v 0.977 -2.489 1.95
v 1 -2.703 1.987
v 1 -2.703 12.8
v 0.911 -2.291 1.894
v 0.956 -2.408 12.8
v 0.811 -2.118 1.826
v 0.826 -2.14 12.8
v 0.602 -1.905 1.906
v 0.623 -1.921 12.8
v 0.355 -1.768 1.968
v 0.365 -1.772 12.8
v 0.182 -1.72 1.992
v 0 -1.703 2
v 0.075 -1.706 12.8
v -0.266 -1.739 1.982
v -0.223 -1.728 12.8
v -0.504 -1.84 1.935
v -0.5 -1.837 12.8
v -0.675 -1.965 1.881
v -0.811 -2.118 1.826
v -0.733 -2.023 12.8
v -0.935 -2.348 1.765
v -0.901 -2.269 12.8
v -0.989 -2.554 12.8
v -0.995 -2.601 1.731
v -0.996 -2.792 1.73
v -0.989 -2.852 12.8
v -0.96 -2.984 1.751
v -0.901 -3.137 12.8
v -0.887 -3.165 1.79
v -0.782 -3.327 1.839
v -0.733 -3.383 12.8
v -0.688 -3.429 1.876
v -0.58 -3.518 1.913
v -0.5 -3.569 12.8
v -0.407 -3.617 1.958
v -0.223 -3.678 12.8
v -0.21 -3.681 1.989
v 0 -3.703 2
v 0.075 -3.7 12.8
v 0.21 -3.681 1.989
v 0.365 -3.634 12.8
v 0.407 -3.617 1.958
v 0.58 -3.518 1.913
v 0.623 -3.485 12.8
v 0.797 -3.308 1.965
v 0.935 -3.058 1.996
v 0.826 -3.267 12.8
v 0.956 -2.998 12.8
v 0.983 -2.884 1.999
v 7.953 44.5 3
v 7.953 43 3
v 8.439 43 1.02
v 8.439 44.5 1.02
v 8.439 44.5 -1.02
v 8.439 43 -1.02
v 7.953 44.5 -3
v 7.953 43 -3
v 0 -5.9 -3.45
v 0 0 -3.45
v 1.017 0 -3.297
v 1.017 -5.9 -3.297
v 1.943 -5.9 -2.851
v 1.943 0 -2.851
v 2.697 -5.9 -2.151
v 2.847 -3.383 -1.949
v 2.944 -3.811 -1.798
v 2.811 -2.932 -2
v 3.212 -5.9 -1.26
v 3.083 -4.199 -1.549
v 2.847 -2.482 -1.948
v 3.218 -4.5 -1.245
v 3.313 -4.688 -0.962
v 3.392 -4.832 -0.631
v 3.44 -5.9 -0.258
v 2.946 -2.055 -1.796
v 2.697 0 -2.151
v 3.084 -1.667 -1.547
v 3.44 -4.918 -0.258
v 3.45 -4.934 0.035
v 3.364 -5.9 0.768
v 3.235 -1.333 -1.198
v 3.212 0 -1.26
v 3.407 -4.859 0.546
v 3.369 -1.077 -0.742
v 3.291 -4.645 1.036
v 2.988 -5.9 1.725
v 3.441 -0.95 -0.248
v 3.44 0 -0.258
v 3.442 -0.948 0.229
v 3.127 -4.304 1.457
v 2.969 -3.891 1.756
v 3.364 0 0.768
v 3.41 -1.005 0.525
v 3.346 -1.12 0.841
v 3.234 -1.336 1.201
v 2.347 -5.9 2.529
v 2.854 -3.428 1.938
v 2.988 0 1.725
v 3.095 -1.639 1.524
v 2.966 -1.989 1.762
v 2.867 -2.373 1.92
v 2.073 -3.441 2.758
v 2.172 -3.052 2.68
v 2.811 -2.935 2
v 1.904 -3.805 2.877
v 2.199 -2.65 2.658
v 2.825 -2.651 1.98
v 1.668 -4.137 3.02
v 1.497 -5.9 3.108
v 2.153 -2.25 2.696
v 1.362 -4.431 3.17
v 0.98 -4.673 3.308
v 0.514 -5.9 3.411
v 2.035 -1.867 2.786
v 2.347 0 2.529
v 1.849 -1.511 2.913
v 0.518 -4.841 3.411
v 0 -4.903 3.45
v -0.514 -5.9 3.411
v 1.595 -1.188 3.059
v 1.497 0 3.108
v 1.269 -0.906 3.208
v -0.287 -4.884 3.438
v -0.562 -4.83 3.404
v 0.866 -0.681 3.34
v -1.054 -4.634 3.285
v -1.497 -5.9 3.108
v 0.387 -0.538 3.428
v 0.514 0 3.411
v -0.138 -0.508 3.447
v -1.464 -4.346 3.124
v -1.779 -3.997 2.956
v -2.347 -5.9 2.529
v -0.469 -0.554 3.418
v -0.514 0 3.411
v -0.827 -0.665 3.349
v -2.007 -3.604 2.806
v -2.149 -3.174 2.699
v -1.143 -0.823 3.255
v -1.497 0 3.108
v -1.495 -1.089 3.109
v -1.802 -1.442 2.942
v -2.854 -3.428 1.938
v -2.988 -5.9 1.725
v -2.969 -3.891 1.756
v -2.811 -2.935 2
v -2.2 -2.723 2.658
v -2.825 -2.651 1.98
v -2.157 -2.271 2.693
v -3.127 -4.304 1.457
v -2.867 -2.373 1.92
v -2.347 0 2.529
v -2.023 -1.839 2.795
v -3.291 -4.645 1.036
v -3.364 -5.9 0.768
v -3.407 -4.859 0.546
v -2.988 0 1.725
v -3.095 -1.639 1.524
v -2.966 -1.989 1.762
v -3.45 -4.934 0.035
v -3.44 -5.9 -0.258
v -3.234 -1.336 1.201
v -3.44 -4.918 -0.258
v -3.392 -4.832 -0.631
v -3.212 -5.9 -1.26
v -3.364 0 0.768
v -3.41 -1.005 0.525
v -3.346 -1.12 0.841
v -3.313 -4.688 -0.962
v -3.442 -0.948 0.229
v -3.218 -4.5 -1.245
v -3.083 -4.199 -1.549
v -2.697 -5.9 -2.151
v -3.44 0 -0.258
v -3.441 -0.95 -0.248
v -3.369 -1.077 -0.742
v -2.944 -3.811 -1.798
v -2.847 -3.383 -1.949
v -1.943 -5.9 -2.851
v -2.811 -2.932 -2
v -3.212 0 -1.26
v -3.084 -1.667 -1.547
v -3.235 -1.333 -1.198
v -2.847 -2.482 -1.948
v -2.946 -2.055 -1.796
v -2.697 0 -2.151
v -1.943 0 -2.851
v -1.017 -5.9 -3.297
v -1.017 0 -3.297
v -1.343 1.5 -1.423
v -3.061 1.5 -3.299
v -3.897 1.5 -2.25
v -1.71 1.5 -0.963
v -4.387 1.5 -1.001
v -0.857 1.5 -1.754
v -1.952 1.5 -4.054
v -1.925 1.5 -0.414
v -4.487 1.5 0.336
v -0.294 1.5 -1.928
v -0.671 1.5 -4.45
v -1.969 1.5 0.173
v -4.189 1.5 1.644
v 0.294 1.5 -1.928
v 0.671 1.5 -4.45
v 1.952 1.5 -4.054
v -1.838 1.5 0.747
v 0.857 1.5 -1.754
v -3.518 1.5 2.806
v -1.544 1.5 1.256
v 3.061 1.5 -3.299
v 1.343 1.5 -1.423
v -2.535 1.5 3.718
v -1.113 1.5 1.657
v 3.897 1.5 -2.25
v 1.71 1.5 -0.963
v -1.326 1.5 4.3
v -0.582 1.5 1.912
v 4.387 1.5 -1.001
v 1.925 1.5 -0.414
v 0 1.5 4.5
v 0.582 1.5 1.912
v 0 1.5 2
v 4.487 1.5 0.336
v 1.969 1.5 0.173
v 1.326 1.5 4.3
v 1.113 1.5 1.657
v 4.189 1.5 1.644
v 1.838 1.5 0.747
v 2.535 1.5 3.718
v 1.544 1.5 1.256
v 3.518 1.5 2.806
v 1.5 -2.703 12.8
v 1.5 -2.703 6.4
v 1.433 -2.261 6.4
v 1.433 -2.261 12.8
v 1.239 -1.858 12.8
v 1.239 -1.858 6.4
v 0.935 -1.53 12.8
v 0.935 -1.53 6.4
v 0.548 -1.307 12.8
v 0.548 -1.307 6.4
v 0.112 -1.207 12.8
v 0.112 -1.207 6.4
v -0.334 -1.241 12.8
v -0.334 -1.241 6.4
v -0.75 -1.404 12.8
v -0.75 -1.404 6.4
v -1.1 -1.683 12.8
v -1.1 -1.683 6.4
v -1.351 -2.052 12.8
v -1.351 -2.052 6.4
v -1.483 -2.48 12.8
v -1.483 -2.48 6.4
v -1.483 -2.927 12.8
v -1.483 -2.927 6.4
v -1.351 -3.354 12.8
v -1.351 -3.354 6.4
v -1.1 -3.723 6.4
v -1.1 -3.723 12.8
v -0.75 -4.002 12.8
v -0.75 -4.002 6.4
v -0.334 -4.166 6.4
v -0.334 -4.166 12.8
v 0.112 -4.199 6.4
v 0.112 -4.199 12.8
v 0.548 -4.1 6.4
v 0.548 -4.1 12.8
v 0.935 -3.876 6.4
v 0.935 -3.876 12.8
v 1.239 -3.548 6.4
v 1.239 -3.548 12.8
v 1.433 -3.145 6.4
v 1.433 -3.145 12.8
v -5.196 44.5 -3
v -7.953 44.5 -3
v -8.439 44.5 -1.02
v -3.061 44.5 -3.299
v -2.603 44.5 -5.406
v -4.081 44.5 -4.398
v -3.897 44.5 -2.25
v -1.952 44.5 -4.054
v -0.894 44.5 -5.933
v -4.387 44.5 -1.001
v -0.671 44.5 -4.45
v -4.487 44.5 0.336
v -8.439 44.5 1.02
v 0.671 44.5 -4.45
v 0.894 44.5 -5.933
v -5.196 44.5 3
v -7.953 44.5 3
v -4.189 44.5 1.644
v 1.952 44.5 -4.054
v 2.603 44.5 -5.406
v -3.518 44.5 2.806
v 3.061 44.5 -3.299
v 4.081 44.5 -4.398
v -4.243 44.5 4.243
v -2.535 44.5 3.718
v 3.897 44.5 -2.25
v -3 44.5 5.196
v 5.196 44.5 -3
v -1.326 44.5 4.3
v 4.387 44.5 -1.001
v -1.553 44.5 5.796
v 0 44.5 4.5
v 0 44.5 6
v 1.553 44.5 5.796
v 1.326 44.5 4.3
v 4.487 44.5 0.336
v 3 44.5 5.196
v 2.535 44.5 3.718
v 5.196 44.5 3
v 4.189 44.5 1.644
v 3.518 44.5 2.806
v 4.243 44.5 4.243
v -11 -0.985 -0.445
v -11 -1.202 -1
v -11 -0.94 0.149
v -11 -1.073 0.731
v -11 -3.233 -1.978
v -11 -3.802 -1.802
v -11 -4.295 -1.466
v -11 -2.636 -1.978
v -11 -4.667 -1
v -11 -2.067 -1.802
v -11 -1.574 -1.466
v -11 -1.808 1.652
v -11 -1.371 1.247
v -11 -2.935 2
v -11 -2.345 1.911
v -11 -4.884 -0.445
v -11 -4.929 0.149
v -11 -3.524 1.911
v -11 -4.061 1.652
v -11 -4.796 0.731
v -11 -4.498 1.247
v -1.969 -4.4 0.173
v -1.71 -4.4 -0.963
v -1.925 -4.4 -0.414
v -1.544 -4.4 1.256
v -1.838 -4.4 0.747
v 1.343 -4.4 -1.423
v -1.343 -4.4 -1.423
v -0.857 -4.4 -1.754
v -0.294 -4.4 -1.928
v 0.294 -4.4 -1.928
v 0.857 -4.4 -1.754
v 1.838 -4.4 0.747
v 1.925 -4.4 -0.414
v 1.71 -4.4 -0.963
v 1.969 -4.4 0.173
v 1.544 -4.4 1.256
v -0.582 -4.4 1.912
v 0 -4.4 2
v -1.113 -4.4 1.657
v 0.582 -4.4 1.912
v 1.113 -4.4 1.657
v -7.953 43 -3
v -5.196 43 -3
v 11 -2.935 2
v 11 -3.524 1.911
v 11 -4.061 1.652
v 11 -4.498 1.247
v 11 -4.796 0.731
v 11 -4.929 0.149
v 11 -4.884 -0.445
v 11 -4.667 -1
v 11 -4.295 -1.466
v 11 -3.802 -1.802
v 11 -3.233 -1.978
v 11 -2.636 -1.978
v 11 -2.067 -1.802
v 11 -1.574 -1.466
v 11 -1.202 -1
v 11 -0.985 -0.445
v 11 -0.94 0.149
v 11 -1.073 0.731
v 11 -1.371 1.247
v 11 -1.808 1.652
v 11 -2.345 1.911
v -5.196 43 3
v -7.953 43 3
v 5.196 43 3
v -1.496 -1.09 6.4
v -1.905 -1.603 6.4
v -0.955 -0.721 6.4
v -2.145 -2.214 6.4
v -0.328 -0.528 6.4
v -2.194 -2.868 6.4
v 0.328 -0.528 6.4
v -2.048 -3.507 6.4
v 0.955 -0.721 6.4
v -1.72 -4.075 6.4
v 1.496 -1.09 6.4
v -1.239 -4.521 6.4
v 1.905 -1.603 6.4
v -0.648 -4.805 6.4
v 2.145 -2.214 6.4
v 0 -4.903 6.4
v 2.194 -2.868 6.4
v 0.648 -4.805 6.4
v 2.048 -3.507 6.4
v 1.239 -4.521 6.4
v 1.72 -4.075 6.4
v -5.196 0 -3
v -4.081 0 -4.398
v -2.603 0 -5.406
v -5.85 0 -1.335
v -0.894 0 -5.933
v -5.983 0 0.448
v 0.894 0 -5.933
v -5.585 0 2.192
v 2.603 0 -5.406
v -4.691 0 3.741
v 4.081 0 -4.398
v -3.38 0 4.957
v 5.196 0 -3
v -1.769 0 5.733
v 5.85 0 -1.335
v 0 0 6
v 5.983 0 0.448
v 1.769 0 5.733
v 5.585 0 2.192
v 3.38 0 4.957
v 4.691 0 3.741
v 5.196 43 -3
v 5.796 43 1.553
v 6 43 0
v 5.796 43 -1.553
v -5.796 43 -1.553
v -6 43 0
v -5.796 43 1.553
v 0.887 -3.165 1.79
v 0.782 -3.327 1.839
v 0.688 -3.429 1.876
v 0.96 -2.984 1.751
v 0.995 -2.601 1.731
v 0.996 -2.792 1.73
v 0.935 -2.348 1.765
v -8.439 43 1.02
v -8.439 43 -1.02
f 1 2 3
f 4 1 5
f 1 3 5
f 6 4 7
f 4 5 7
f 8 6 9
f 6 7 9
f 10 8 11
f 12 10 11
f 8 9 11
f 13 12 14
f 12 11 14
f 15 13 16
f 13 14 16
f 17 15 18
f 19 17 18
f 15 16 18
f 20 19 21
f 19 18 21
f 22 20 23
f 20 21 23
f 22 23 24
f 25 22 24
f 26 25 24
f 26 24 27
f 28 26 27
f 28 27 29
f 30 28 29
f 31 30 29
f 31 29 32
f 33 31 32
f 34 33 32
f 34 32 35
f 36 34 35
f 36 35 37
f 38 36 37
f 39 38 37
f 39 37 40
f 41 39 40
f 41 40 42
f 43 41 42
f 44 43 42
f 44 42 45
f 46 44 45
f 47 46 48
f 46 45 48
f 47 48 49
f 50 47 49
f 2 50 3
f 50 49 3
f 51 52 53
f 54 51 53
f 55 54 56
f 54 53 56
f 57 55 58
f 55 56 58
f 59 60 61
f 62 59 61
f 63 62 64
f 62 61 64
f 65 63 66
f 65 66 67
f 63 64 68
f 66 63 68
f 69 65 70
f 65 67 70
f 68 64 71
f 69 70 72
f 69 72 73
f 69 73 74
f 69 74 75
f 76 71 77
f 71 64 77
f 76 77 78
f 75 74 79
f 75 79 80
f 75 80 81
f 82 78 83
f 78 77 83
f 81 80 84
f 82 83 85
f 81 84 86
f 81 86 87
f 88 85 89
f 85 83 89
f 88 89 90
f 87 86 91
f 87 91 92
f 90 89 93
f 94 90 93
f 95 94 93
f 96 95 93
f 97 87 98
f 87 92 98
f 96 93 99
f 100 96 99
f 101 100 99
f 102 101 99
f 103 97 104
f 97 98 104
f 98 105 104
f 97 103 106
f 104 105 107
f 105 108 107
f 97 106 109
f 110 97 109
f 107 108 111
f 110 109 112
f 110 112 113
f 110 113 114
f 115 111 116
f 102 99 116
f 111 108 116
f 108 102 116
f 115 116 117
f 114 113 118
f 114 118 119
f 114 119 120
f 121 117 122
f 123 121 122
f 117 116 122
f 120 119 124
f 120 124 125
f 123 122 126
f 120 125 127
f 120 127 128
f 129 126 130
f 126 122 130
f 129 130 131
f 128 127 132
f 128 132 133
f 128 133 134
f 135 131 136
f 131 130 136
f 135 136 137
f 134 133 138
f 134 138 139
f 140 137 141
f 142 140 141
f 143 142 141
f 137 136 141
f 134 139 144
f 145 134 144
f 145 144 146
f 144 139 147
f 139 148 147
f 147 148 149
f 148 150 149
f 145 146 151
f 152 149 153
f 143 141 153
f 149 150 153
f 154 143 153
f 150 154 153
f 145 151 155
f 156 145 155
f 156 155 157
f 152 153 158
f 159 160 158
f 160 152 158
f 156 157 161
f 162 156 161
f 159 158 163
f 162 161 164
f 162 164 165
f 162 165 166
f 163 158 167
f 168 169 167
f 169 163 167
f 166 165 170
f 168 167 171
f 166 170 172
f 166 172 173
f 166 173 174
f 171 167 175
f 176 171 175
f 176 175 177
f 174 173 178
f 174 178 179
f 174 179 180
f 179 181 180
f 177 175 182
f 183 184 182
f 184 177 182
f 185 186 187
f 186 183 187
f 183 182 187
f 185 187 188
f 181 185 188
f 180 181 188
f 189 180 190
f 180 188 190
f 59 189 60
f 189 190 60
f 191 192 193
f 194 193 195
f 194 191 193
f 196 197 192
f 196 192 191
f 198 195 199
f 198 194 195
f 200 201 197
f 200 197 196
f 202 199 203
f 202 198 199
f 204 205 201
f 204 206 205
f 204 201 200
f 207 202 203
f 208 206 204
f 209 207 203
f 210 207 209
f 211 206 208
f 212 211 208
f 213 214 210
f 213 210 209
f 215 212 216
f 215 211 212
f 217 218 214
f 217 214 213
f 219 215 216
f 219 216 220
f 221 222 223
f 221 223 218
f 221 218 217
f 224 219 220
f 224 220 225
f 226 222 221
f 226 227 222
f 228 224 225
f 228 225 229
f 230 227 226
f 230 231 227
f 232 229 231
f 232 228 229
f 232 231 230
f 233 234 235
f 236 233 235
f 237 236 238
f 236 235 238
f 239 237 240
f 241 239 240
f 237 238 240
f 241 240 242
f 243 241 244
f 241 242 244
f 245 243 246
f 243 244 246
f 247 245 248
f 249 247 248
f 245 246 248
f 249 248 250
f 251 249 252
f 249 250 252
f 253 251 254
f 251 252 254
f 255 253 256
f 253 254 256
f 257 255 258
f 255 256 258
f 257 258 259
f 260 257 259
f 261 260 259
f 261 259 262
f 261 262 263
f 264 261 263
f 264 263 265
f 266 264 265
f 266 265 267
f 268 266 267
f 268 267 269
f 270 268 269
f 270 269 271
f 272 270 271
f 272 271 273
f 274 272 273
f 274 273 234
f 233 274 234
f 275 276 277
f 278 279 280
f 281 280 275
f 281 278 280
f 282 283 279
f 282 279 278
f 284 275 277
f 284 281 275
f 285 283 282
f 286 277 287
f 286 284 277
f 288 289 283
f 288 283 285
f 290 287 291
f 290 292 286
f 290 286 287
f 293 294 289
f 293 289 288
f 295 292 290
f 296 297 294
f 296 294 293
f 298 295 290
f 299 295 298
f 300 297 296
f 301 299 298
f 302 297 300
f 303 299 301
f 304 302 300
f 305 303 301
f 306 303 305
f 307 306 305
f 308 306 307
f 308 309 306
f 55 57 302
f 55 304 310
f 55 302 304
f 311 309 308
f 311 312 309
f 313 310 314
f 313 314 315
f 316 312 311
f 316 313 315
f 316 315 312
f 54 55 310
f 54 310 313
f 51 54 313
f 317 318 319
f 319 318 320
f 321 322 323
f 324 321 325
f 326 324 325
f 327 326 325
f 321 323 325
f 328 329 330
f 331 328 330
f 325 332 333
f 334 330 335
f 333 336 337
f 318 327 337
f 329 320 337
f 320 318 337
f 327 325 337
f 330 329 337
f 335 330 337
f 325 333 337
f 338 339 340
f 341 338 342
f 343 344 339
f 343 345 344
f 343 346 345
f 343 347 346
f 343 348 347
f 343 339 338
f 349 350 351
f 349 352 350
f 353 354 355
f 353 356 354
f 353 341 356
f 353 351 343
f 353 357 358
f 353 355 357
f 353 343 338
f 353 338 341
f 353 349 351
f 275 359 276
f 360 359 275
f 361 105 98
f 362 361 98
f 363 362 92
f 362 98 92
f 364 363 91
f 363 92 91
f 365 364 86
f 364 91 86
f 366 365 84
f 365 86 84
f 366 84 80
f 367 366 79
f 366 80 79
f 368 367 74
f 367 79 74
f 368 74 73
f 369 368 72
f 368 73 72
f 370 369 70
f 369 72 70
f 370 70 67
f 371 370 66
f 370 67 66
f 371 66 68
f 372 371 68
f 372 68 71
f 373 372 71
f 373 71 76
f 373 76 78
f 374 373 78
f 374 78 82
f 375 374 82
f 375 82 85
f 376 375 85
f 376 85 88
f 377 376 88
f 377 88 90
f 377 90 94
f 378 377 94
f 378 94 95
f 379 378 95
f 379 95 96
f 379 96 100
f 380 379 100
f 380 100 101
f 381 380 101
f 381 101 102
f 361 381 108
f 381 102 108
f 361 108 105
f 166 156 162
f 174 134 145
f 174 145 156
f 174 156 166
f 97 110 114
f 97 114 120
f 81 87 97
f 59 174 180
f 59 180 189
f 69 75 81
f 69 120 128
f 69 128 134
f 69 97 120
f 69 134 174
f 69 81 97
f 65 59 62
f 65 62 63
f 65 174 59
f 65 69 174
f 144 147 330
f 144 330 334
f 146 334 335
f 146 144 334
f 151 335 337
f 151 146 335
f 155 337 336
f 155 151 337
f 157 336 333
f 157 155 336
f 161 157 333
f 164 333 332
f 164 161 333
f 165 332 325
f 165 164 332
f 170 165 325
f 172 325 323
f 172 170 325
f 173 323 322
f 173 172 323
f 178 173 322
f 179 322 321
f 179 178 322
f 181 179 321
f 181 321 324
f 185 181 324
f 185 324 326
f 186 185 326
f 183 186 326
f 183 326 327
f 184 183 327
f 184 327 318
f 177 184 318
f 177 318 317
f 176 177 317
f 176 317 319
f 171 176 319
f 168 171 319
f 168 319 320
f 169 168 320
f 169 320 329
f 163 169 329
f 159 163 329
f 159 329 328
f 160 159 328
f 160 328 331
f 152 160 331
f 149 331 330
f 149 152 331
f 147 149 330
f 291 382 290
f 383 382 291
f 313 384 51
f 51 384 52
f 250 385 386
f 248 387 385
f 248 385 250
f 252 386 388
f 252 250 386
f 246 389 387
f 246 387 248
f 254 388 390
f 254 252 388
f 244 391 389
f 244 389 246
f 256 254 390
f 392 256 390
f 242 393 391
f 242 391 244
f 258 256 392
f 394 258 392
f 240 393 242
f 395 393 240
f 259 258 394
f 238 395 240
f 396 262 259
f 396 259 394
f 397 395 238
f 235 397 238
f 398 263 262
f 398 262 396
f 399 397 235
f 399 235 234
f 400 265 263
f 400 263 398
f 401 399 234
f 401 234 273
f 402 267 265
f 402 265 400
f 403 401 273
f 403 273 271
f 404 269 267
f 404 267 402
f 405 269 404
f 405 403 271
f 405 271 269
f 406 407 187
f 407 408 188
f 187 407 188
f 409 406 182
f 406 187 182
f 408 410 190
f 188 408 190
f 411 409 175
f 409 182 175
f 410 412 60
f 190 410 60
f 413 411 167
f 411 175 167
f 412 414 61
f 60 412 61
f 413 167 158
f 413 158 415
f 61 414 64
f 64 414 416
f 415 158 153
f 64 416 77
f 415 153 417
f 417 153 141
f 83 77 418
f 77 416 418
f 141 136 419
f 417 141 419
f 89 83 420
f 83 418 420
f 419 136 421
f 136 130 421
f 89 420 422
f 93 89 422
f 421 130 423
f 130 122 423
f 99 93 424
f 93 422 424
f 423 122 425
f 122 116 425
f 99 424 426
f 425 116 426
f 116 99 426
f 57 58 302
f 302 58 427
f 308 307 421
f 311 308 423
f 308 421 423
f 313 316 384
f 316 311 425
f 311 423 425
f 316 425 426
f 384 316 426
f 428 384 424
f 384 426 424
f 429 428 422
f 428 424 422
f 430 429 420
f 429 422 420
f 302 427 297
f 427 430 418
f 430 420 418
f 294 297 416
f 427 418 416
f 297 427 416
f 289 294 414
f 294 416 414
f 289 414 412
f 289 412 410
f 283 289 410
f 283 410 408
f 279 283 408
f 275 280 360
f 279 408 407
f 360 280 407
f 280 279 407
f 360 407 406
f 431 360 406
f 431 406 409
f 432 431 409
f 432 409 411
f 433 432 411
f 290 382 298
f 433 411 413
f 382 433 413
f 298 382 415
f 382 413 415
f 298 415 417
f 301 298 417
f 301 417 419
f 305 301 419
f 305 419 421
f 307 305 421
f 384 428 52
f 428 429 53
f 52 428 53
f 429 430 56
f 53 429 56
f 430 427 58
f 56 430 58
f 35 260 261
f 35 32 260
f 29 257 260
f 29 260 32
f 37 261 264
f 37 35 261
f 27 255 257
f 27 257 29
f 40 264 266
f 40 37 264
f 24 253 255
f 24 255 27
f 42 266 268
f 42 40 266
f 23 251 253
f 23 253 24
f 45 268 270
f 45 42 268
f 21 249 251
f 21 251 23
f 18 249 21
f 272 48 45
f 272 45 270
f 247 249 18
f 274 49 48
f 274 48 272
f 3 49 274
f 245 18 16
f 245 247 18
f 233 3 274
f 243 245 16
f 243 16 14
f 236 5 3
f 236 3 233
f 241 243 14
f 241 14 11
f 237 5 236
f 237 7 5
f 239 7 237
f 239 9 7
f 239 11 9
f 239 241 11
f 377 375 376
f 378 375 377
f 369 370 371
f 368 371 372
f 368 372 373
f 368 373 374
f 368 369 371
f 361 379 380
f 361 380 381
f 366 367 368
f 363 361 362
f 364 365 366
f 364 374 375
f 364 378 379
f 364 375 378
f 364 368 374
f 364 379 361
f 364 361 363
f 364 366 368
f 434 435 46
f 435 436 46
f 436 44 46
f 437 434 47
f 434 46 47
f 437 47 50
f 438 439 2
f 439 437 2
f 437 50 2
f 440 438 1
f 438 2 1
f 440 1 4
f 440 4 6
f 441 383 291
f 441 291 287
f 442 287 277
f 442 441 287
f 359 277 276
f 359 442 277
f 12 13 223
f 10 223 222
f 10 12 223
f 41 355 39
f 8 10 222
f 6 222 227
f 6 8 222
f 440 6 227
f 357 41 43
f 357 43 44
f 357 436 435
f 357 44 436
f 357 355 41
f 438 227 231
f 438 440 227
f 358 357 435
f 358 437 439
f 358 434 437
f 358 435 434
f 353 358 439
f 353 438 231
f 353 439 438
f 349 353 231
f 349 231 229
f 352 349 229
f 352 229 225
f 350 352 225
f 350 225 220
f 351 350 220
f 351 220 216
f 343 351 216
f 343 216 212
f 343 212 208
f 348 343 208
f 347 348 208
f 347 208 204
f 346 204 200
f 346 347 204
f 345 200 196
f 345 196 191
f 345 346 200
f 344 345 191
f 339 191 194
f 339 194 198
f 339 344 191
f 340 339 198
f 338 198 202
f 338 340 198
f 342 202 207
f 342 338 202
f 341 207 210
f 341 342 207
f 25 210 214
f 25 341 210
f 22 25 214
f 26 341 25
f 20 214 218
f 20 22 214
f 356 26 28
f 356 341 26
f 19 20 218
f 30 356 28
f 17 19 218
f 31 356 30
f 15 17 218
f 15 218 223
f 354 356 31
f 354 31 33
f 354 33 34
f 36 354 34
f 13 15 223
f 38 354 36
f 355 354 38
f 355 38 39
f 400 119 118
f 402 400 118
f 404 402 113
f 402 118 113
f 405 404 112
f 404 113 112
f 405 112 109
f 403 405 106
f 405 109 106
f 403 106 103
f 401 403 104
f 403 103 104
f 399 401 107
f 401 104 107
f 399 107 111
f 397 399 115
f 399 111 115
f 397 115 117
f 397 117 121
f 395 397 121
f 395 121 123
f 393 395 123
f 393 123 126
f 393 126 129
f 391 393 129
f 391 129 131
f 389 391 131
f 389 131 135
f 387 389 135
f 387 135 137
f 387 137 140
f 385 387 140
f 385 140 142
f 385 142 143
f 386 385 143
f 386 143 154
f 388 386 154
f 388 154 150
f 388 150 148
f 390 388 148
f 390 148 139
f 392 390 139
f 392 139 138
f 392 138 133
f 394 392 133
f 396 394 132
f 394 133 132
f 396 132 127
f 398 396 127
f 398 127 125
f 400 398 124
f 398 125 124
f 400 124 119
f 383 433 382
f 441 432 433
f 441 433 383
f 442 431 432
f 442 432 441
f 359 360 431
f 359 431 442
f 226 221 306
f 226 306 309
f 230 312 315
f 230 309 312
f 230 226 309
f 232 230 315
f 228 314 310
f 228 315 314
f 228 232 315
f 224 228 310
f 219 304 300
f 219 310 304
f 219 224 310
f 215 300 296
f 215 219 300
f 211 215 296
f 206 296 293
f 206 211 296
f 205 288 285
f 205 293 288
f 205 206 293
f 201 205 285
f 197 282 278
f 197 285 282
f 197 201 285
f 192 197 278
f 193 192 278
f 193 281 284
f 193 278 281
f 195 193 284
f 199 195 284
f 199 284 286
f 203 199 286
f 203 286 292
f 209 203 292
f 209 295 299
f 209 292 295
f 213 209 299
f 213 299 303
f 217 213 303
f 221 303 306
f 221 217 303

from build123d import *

# Parameters (mm, degrees)
SKETCH1_R           = 6
BOSS_EXTRUDE1_DEPTH = 44.5
SHELL1_T            = -1.5
SKETCH3_R           = 3.45
BOSS_EXTRUDE3_DEPTH = 5.9
SHELL2_START        = -4.4
SHELL2_OUTLINE_R    = 1.95
SHELL2_DEPTH        = 5.9
SKETCH5_R           = 2.2
BOSS_EXTRUDE4_DEPTH = 6.4
SKETCH6_R           = 1.5
BOSS_EXTRUDE5_DEPTH = 6.4
SKETCH7_R           = 1
CUT_EXTRUDE1_DEPTH  = 12.4
SKETCH8_R           = 1.95
CUT_EXTRUDE2_DEPTH  = 51.902357509
SKETCH9_R           = 2
BOSS_EXTRUDE6_DEPTH = 11
SKETCH10_R          = 1.975
CUT_EXTRUDE3_DEPTH  = 52.730551947
SKETCH11_R          = 1
CUT_EXTRUDE4_DEPTH  = 12
BOSS_EXTRUDE8_START = -1.5
BOSS_EXTRUDE8_DEPTH = 1.5


# Read off the part's stored shape, not the designer's step: Shell2
with BuildPart() as part:
    # Sketch1 → Boss-Extrude1 (new body)
    with BuildSketch(Plane(origin=(0, 0, 0), x_dir=(1, 0, 0), z_dir=(0, 1, 0))):
        with Locations(Location((0, 0, 0), (0, 0, 270))):
            Circle(SKETCH1_R)
    extrude(amount=BOSS_EXTRUDE1_DEPTH)

    # Shell1
    shell1_openings = [part.faces().sort_by_distance(p)[0] for p in [
        (0, 44.5, 0),
    ]]
    offset(amount=SHELL1_T, openings=shell1_openings, kind=Kind.INTERSECTION)

    # Sketch3 → Boss-Extrude3 (add)
    with BuildSketch(Plane.XZ):
        with Locations(Location((0, 0, 0), (0, 0, 270))):
            Circle(SKETCH3_R)
    extrude(amount=BOSS_EXTRUDE3_DEPTH)

    # Shell2 outline → Shell2 (cut)
    with BuildSketch(Plane(origin=(0, 0, 0), x_dir=(1, 0, 0), z_dir=(0, 1, 0)).offset(SHELL2_START)):
        Circle(SHELL2_OUTLINE_R)
    extrude(amount=SHELL2_DEPTH, mode=Mode.SUBTRACT)

    # Sketch5 → Boss-Extrude4 (add)
    with BuildSketch(Plane.XY):
        with Locations(Location((0, -2.70320485, 0), (0, 0, 270))):
            Circle(SKETCH5_R)
    extrude(amount=BOSS_EXTRUDE4_DEPTH)

    # Sketch6 → Boss-Extrude5 (add)
    with BuildSketch(Plane.XY.offset(6.4)):
        with Locations((0, -2.70320485)):
            Circle(SKETCH6_R)
    extrude(amount=BOSS_EXTRUDE5_DEPTH)

    # Sketch7 → Cut-Extrude1 (cut)
    with BuildSketch(Plane.XY.offset(12.8)):
        with Locations((0, -2.70320485)):
            Circle(SKETCH7_R)
    extrude(amount=-CUT_EXTRUDE1_DEPTH, mode=Mode.SUBTRACT)

    # Sketch8 → Cut-Extrude2 (cut, through all)
    with BuildSketch(Plane(origin=(0, -4.4, 0), x_dir=(1, 0, 0), z_dir=(0, 1, 0))):
        with Locations(Location((0, 0, 0), (0, 0, 270))):
            Circle(SKETCH8_R)
    extrude(amount=CUT_EXTRUDE2_DEPTH, mode=Mode.SUBTRACT)

    # Sketch9 → Boss-Extrude6 (add)
    with BuildSketch(Plane(origin=(0, 0, 0), x_dir=(0, 0, -1), z_dir=(1, 0, 0))):
        with Locations(Location((0, -2.934503104, 0), (0, 0, 180))):
            Circle(SKETCH9_R)
    extrude(amount=BOSS_EXTRUDE6_DEPTH)

    # Sketch10 → Cut-Extrude3 (cut, through all)
    with BuildSketch(Plane(origin=(0, -4.4, 0), x_dir=(1, 0, 0), z_dir=(0, 1, 0))):
        with Locations(Location((0, -0.025, 0), (0, 0, 270))):
            Circle(SKETCH10_R)
    extrude(amount=CUT_EXTRUDE3_DEPTH, mode=Mode.SUBTRACT)

    # Sketch11 → Cut-Extrude4 (cut)
    with BuildSketch(Plane.XY.offset(12.8)):
        with Locations((0, -2.70320485)):
            Circle(SKETCH11_R)
    extrude(amount=-CUT_EXTRUDE4_DEPTH, mode=Mode.SUBTRACT)

    # Mirror5: part across plane


with BuildPart() as part_1:
    add(part.part)
    add(part.part.mirror(Plane(origin=(0, 0, 0), x_dir=(0, 0, 1), z_dir=(1, 0, 0))))

    # Sketch13 → Boss-Extrude8 (add)
    with BuildSketch(Plane(origin=(0, 44.5, 0), x_dir=(1, 0, 0), z_dir=(0, 1, 0)).offset(BOSS_EXTRUDE8_START)):
        with BuildLine():
            Line((-5.196152423, -3), (-7.95298686, -3))
            ThreePointArc((-7.95298686, -3), (-8.5, 0), (-7.95298686, 3))
            Line((-7.95298686, 3), (-5.196152423, 3))
            ThreePointArc((-5.196152423, 3), (-6, 0), (-5.196152423, -3))
        make_face()
        with BuildLine():
            Line((5.196152423, -3), (7.95298686, -3))
            ThreePointArc((7.95298686, -3), (8.5, 0), (7.95298686, 3))
            Line((7.95298686, 3), (5.196152423, 3))
            ThreePointArc((5.196152423, 3), (6, 0), (5.196152423, -3))
        make_face()
    extrude(amount=BOSS_EXTRUDE8_DEPTH)


solid = part_1.part
